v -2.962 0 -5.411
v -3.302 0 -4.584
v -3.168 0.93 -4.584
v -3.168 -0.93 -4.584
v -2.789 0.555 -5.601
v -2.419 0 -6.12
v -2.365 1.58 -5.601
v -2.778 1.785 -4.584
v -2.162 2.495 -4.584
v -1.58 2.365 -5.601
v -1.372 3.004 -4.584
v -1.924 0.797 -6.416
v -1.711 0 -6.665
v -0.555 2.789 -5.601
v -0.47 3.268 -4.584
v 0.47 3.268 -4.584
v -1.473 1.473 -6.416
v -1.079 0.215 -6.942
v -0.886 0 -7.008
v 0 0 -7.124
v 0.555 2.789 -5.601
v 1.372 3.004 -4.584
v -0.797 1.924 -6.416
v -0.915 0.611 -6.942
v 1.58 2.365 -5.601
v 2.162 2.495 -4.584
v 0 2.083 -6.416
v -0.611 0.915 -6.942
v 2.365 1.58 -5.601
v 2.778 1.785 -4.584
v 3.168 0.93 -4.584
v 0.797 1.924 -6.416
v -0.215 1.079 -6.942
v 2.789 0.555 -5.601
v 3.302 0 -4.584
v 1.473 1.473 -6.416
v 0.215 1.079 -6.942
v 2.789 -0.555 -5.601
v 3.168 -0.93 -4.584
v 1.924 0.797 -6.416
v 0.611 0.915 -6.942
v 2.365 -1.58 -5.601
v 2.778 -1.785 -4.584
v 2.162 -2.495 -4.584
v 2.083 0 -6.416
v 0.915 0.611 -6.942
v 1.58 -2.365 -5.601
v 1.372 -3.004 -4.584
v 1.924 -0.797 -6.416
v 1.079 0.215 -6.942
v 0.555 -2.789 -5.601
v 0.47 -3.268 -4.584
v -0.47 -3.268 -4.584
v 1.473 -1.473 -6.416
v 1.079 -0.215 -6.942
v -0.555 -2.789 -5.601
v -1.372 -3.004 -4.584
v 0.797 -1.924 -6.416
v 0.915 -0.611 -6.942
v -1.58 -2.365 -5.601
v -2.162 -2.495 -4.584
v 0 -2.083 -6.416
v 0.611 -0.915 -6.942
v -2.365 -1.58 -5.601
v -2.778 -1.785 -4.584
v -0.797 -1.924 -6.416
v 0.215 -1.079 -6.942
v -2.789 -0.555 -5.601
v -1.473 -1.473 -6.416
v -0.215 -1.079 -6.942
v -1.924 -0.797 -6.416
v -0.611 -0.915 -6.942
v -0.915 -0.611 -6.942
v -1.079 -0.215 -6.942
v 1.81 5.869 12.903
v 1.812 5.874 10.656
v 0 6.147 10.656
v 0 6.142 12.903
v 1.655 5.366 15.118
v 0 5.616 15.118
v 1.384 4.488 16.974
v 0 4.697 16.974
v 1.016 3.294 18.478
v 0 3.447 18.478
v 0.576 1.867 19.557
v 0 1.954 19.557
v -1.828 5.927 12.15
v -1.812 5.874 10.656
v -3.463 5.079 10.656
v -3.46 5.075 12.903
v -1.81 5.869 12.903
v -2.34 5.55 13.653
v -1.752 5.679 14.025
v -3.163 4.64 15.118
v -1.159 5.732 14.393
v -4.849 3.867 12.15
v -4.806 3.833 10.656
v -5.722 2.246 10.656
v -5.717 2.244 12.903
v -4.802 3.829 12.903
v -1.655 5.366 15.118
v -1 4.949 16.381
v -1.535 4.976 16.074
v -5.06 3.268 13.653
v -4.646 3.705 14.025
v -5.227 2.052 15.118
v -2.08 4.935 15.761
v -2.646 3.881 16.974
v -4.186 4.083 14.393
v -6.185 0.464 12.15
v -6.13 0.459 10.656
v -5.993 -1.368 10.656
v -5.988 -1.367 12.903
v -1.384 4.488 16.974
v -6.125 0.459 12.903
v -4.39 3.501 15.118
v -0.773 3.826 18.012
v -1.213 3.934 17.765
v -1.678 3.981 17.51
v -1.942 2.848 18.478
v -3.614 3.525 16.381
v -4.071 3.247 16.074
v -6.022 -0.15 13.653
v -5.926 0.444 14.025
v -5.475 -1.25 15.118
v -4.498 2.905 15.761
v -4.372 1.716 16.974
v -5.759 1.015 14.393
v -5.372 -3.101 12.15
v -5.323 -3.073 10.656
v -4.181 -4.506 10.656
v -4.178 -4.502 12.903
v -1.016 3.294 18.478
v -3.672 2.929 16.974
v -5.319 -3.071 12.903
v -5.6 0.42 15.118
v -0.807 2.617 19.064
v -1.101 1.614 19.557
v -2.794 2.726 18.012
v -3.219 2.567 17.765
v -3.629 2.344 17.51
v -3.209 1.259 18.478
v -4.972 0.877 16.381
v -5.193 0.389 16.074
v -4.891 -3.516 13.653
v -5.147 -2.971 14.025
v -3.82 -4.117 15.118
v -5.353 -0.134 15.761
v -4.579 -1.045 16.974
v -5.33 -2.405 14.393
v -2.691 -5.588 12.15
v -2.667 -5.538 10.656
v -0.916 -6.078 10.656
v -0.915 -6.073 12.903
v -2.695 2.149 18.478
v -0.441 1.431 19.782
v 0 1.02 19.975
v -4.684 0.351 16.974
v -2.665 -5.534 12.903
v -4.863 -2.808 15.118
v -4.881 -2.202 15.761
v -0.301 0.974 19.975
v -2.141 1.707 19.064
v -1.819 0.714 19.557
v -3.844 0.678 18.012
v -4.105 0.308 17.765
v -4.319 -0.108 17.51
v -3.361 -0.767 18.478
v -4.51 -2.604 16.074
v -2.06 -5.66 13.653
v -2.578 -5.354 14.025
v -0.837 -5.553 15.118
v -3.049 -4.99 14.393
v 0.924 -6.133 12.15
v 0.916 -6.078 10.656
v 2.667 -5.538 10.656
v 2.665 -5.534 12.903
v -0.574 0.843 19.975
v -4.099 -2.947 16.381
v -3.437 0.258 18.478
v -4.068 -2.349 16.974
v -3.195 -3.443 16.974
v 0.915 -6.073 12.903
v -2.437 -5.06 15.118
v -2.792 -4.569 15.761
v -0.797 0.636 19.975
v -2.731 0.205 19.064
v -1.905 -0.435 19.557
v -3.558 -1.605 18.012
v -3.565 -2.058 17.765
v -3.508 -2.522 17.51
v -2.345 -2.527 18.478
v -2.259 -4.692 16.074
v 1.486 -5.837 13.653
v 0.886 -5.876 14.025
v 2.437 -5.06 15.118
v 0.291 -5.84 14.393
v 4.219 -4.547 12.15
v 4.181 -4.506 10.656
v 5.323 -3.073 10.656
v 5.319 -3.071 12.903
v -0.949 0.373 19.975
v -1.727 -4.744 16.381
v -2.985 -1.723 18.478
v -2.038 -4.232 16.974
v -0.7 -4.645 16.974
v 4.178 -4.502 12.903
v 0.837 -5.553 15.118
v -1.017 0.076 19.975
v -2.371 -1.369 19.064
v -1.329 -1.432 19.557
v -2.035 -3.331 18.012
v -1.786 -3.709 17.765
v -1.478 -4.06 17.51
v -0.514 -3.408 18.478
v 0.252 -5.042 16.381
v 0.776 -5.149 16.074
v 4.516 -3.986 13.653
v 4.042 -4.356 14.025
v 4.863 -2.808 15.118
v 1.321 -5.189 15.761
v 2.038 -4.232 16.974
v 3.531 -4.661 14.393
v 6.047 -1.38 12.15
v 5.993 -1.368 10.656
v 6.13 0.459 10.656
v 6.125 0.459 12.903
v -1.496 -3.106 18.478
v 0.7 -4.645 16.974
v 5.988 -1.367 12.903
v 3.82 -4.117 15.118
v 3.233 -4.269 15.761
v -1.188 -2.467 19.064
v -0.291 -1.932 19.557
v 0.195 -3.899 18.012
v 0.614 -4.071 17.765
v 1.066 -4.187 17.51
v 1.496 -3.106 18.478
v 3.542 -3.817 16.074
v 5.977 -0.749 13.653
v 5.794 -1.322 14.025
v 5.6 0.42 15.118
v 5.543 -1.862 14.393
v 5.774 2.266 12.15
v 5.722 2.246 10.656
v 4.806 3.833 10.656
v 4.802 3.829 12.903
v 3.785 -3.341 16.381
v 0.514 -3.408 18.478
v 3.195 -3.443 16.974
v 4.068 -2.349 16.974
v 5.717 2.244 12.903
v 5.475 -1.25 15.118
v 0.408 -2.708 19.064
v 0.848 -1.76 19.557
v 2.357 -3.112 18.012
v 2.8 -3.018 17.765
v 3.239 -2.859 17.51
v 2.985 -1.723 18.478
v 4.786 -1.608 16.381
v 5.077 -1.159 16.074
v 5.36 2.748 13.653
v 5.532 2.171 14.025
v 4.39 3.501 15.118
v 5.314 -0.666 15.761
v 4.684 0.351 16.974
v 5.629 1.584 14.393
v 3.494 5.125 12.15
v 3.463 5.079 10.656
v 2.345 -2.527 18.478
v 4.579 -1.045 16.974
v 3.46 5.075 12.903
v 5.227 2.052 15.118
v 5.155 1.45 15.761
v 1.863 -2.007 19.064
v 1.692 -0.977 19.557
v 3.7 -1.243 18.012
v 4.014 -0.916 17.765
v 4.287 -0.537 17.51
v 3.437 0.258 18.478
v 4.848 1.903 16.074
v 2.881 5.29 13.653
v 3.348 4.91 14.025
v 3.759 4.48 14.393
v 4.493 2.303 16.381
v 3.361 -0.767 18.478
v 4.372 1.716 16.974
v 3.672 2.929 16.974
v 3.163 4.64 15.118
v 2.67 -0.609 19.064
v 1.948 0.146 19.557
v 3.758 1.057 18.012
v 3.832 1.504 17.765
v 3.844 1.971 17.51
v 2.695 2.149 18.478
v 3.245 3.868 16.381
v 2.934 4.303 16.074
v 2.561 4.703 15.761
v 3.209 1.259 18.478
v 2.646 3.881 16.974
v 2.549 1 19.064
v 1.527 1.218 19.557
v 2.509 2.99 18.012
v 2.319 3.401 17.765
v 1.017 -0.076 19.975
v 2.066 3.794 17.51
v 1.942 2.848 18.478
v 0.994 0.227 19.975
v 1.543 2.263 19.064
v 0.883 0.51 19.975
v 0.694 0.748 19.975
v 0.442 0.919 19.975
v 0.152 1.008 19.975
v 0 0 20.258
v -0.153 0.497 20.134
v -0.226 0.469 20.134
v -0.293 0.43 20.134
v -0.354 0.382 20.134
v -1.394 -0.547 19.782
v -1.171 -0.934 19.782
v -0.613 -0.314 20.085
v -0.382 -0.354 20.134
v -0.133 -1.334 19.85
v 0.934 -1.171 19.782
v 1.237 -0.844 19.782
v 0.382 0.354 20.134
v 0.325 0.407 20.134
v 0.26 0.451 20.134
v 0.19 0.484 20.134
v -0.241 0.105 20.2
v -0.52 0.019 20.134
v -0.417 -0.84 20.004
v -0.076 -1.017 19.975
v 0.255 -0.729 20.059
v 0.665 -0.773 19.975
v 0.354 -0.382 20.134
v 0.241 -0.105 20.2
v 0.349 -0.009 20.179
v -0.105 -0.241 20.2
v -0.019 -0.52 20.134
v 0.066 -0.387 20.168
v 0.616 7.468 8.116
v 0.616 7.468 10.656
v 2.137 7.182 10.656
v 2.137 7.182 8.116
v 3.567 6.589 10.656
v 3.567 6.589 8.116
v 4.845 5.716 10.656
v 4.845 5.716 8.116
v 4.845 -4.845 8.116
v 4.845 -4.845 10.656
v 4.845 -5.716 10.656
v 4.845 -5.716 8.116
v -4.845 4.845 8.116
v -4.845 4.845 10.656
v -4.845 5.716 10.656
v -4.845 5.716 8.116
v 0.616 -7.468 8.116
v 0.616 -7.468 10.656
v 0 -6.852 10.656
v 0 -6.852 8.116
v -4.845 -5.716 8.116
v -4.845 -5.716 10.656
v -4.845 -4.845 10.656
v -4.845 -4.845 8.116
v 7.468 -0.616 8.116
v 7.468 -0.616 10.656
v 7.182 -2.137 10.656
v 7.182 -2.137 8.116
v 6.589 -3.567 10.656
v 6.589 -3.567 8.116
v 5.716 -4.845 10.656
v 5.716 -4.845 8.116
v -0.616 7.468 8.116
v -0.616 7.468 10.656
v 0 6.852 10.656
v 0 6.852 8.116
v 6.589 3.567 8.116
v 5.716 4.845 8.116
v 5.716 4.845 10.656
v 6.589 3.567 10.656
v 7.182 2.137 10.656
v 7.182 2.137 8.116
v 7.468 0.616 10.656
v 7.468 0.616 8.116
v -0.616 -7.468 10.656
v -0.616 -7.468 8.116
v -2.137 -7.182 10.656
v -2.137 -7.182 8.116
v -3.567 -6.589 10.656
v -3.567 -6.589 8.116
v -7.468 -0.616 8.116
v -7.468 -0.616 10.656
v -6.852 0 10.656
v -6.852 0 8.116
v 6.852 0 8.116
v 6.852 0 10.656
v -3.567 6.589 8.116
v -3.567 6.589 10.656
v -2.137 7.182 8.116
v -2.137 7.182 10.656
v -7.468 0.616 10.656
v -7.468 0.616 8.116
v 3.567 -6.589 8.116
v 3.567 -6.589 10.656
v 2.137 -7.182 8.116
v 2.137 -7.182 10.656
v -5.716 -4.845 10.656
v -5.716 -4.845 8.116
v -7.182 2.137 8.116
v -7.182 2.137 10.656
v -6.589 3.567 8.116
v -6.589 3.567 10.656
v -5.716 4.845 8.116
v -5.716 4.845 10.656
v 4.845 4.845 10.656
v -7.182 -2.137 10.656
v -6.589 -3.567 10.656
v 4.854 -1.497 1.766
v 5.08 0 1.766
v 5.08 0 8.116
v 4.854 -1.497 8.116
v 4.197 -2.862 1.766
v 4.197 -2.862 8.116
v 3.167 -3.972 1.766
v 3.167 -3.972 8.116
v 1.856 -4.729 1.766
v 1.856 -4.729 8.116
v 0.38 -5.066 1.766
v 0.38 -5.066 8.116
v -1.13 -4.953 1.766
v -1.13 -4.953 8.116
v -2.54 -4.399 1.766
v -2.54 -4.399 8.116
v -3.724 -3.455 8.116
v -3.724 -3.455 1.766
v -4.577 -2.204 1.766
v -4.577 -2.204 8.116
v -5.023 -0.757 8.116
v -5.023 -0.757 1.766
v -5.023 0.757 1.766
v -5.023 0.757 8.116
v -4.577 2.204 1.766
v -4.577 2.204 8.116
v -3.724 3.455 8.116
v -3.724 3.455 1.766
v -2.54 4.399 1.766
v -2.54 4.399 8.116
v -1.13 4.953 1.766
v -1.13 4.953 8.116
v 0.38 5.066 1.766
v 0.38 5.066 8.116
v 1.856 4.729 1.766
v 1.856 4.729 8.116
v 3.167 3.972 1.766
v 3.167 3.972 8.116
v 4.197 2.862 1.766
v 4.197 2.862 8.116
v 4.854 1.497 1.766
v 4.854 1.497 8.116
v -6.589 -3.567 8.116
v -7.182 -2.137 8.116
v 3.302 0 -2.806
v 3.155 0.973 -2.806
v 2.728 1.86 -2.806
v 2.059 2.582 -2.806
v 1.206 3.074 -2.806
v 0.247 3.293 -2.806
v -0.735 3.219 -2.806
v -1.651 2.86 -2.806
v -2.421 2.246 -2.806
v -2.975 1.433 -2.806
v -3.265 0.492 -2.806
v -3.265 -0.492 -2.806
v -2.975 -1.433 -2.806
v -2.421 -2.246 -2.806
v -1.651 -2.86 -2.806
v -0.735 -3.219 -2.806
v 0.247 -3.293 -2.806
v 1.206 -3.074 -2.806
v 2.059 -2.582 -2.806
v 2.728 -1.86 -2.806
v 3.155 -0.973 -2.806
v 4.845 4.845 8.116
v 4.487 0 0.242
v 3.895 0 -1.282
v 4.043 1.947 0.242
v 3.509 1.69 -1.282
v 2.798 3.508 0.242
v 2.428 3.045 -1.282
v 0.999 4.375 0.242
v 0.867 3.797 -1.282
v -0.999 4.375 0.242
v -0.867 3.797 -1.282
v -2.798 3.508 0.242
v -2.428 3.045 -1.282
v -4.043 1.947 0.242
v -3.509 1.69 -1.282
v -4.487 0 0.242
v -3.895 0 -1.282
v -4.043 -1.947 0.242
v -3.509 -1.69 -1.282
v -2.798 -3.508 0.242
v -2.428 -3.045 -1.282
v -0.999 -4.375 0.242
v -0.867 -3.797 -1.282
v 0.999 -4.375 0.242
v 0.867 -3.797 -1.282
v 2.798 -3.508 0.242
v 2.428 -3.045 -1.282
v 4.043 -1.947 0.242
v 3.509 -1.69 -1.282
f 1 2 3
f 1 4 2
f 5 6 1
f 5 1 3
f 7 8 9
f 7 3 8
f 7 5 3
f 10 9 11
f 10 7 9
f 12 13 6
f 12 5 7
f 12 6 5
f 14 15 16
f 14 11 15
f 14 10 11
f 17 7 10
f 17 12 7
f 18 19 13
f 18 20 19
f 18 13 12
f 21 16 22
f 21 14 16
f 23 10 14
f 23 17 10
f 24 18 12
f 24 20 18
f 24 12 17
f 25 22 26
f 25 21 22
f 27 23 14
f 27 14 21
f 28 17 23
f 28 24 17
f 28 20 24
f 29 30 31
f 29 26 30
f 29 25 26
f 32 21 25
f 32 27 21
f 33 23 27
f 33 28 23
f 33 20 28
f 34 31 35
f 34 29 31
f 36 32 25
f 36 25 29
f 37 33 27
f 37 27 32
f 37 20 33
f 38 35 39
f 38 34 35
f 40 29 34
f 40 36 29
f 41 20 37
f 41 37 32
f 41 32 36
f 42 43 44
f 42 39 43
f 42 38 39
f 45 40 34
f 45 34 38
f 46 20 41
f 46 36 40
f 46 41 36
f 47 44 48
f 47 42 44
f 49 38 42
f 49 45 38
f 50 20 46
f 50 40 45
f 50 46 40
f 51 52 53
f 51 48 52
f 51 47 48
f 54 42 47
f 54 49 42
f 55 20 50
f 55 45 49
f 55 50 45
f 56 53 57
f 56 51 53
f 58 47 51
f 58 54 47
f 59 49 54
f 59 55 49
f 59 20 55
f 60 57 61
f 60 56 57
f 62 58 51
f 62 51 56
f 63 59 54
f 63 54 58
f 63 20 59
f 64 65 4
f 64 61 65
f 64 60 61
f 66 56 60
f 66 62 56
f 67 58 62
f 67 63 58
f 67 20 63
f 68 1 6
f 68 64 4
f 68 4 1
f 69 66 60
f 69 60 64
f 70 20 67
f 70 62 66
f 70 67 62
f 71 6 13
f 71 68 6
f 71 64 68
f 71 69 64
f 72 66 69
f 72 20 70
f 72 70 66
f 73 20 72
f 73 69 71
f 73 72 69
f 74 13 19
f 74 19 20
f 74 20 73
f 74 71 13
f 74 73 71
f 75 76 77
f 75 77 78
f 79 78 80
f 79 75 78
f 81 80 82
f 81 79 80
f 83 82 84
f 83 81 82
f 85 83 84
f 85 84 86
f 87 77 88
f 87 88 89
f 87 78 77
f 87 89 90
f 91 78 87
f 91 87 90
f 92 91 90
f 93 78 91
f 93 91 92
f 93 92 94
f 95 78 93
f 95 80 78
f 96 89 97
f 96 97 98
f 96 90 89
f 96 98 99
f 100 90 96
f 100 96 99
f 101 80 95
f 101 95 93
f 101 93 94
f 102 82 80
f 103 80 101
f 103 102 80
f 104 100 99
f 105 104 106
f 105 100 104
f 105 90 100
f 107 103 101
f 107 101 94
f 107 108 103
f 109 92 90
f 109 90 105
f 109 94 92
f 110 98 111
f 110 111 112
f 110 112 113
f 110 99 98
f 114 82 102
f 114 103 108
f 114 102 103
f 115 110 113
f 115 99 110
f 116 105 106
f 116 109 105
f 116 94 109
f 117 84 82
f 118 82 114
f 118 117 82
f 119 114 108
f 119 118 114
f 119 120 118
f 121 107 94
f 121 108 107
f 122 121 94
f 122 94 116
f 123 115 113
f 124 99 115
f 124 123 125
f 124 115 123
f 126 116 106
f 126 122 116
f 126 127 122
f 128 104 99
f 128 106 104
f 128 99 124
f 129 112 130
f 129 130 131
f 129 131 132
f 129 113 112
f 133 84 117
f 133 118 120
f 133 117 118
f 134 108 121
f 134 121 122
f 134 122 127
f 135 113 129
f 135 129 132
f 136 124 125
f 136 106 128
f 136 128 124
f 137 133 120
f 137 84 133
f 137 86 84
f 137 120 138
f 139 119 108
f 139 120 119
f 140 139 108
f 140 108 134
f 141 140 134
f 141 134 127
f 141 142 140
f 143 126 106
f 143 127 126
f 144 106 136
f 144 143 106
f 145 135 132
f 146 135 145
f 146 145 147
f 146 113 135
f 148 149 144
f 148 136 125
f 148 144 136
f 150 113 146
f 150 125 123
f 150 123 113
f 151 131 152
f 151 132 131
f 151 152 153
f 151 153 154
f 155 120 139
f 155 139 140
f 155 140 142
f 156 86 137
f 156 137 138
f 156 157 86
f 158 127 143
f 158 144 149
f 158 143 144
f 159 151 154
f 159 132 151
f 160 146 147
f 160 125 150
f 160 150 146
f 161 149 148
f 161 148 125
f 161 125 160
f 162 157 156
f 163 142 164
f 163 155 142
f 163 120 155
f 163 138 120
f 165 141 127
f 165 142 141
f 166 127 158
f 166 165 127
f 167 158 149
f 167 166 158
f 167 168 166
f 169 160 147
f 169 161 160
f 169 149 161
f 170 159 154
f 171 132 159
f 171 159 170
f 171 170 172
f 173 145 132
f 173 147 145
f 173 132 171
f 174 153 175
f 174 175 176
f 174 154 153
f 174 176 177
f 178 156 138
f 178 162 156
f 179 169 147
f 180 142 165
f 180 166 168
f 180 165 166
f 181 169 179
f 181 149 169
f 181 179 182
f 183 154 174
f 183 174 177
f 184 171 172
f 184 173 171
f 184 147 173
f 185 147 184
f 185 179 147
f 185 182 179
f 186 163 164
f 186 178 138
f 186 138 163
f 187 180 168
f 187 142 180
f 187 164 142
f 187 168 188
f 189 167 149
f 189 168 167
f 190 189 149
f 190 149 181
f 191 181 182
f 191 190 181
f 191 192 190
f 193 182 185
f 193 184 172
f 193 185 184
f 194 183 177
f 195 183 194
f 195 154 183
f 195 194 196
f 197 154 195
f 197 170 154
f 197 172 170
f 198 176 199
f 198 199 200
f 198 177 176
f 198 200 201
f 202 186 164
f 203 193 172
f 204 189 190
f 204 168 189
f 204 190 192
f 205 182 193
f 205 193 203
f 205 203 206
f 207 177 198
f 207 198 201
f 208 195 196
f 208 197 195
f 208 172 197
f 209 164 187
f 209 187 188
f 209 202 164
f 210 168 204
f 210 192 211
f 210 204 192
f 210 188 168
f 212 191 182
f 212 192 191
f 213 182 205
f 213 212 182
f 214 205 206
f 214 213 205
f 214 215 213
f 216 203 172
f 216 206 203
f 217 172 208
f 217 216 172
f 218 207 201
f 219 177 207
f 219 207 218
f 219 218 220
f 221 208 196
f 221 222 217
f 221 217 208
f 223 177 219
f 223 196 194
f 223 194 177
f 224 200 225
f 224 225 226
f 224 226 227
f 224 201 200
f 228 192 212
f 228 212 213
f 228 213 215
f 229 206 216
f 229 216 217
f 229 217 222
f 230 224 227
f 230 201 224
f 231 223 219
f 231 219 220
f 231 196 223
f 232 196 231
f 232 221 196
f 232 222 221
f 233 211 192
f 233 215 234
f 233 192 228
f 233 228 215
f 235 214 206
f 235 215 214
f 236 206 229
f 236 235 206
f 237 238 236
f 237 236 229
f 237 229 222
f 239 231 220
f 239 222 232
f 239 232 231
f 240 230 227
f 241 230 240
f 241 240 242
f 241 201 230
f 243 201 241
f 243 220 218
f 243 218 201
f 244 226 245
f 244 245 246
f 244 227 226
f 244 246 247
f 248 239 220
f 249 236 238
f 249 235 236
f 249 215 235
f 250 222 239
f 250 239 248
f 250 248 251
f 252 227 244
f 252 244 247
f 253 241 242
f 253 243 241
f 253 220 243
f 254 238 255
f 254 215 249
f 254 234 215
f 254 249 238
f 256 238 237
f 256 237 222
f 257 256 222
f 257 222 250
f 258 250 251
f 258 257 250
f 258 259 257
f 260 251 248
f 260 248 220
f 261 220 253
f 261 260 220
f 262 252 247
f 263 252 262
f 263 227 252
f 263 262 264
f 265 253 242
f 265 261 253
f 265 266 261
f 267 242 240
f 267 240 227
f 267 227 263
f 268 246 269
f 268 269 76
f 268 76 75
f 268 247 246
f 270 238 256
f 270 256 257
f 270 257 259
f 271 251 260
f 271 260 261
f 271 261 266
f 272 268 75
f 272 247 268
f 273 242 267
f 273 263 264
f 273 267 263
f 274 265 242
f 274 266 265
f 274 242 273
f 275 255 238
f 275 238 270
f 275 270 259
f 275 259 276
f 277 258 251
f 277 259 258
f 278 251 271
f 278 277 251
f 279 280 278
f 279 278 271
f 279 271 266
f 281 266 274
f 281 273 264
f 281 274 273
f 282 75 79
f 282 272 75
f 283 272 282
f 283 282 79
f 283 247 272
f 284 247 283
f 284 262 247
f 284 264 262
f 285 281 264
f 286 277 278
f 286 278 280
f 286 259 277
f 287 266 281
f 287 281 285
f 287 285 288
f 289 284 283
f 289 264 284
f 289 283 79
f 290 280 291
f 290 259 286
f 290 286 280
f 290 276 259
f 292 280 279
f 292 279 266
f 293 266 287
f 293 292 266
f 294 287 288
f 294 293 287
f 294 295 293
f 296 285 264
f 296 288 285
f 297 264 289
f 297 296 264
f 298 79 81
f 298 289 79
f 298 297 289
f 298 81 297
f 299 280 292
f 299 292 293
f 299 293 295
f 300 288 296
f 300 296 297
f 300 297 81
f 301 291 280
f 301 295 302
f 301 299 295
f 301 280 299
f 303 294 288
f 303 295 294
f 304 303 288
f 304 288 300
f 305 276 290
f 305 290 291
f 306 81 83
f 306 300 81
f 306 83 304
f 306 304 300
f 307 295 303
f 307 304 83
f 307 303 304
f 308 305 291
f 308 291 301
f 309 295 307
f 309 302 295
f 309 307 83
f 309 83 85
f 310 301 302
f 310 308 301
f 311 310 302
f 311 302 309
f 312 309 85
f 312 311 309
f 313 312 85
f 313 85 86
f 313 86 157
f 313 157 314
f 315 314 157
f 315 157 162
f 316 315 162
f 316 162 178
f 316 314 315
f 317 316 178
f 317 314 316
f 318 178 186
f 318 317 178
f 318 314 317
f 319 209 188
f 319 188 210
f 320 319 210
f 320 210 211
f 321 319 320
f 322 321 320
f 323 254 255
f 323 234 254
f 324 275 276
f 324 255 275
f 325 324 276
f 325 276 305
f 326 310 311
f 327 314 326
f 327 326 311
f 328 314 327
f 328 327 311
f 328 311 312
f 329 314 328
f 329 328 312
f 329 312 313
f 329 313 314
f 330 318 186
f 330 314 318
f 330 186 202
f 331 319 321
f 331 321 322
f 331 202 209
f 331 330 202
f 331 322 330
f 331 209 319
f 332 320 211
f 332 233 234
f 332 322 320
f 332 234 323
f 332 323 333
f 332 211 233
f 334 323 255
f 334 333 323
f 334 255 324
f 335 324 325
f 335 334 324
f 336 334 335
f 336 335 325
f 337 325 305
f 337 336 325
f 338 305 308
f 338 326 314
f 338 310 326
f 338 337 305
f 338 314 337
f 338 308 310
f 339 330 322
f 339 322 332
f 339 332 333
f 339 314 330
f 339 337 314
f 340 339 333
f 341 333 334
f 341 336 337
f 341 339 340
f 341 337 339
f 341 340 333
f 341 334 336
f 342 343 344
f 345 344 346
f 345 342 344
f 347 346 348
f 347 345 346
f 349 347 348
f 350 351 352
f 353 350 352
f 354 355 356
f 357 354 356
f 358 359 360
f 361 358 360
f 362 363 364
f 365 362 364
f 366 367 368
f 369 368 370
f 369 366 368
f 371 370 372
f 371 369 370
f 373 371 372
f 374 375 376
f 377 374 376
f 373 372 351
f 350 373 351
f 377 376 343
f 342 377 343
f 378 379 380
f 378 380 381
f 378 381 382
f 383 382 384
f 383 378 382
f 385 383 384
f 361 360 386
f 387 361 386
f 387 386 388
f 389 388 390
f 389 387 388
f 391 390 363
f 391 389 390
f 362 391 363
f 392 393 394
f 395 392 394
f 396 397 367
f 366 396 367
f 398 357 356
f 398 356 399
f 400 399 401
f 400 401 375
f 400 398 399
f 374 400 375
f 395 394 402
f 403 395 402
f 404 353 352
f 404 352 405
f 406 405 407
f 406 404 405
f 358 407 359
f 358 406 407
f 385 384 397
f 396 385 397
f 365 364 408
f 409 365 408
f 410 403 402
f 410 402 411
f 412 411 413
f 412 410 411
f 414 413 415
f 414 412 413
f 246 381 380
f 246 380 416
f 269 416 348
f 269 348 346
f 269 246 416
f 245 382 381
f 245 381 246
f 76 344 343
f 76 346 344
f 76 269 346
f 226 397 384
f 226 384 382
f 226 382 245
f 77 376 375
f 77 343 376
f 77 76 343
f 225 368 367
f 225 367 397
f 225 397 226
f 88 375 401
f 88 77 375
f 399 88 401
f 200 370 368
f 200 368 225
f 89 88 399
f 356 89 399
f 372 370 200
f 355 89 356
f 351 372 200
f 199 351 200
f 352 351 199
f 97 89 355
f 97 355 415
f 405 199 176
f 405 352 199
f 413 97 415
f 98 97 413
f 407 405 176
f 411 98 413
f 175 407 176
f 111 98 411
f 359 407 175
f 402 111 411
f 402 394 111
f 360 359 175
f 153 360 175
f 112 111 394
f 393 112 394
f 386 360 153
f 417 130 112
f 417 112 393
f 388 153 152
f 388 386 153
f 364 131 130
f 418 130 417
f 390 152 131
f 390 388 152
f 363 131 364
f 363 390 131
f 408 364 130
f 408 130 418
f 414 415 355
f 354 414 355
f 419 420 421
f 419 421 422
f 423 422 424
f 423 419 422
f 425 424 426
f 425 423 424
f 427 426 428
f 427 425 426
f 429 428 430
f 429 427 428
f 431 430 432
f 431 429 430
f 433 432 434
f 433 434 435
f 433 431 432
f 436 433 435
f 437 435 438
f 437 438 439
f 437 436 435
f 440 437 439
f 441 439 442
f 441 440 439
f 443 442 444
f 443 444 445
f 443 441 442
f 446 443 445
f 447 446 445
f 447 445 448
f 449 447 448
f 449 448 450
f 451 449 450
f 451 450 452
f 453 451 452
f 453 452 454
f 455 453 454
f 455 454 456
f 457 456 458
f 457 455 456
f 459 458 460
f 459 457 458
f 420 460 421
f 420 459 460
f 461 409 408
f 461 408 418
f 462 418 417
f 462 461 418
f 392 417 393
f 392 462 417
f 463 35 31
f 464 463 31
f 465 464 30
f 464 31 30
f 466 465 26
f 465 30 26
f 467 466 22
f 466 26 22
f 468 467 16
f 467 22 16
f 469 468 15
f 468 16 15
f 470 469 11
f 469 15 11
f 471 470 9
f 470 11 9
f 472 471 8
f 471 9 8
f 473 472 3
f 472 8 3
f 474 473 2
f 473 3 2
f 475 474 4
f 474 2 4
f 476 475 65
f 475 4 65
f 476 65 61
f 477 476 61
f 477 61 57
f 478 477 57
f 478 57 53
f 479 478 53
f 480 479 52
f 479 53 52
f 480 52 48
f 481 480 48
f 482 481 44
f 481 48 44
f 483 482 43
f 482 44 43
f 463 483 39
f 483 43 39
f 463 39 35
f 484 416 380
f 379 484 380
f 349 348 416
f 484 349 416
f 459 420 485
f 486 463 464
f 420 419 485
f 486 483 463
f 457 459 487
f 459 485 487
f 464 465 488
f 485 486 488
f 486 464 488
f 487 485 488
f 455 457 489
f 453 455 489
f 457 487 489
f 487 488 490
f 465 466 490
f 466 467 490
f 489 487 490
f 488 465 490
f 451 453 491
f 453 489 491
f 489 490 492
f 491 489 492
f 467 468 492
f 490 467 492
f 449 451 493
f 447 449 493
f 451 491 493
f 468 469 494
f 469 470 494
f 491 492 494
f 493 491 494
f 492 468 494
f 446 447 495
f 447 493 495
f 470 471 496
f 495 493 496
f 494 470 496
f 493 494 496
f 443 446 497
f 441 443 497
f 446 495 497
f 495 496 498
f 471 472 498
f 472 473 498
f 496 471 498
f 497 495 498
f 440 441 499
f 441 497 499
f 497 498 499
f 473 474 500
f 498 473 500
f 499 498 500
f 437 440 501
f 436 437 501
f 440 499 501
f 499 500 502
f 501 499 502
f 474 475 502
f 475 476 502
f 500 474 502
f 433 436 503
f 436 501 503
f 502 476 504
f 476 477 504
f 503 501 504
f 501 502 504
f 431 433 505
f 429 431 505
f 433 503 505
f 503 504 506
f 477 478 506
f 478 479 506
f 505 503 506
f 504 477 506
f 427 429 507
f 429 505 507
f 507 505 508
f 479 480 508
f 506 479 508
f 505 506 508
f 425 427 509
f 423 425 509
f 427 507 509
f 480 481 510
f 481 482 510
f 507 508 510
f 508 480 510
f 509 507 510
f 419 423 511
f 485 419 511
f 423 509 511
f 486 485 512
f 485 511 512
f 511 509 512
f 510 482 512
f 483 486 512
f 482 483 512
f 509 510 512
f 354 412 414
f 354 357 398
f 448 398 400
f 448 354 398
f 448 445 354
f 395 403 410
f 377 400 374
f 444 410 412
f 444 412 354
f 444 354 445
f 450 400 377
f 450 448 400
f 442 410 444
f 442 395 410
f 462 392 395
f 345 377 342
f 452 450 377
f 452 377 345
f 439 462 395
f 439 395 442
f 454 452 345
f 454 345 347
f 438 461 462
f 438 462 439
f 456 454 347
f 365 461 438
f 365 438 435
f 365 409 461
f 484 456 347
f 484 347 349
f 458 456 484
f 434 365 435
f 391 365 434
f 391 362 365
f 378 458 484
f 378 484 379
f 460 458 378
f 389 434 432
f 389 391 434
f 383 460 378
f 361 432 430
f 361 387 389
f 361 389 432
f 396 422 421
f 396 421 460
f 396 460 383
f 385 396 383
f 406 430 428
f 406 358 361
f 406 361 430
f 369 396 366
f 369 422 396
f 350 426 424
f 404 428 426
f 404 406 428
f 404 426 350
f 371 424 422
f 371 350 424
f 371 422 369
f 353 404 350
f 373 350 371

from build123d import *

# Parameters (mm, degrees)
DOME2_FACE_RADIUS  = 3.302
DOME2_HEIGHT       = 2.54
CUT_EXTRUDE2_DEPTH = 21.698272827
SEEDCUT_COUNT      = 8


# Read off the part's stored shape, not the designer's step: Cut-Revolve-Thin5
with BuildPart() as part:
    # Sketch5 → Revolve1 (revolve)
    with BuildSketch(Plane(origin=(0, 0, 0), x_dir=(0, 0, -1), z_dir=(1, 0, 0)), mode=Mode.PRIVATE) as revolve1_sk:
        Polygon((-10.655580084, 0), (-10.655580084, 7.493), (-8.115580084, 7.493), (-8.115580084, 5.08), (4.584419916, 5.08), (4.584419916, 0), align=None)
    revolve(revolve1_sk.sketch.rotate(Axis((0, 0, 7.652463568), (0, 0, -1)), 90), axis=Axis((0, 0, 7.652463568), (0, 0, -1)))

    # Sketch8 → Revolve3 (revolve)
    with BuildSketch(Plane(origin=(0, 0, 0), x_dir=(0, 0, -1), z_dir=(1, 0, 0))):
        with BuildLine():
            Line((-20.257637537, 0), (-10.655580084, 0))
            Line((-10.655580084, 0), (-10.655580084, 6.146975902))
            add(Edge.make_bspline(
                [(-10.655580084, 6.146975902), (-14.696094585, 6.626842046), (-19.387675836, 4.389685938), (-20.257637537, 0)],
                knots=[0, 0, 0, 0, 1, 1, 1, 1], degree=3))
        make_face()
    revolve(axis=Axis((0, 0, 7.652463568), (0, 0, 1)))

    # Cut-Revolve-Thin5 outline → Cut-Revolve-Thin5 (revolve, cut)
    with BuildSketch(Plane.XZ):
        Polygon((3.302, -2.806419916), (3.302, -4.584419916), (5.08, -4.584419916), (5.08, 1.765580084), align=None)
    revolve(axis=Axis((0, 0, 0), (0, 0, 1)), mode=Mode.SUBTRACT)

    # Dome2: a dome of height H over a round flat face of radius A is a cap of a sphere of radius (A * A + H * H) / (2 * H)
    dome2_r = (DOME2_FACE_RADIUS * DOME2_FACE_RADIUS + DOME2_HEIGHT * DOME2_HEIGHT) / (2 * DOME2_HEIGHT)
    dome2_base = Plane((0, 0, -4.584419916), z_dir=(0, 0, -1))
    with Locations(dome2_base.offset(DOME2_HEIGHT - dome2_r)):
        dome2_ball = Sphere(dome2_r, mode=Mode.PRIVATE)
    add(split(dome2_ball, bisect_by=dome2_base, keep=Keep.TOP, mode=Mode.PRIVATE))

    # Sketch12 → Cut-Extrude2 (cut, through all)
    with BuildSketch(Plane.XY.offset(10.655580084)):
        with BuildLine():
            Line((0, 6.851966826), (0.615694723, 7.467661549))
            ThreePointArc((0.615694723, 7.467661549), (0, 7.493), (-0.615694723, 7.467661549))
            Line((-0.615694723, 7.467661549), (0, 6.851966826))
        make_face()
    cut_extrude2 = extrude(amount=-CUT_EXTRUDE2_DEPTH, mode=Mode.SUBTRACT)

    # SeedCut: Cut-Extrude2 ×8 about axis
    seedcut_axis = Axis((0, 0, 0), (0, 0, 1))
    for i in range(1, SEEDCUT_COUNT):
        add(cut_extrude2.rotate(seedcut_axis, i * 360 / SEEDCUT_COUNT), mode=Mode.SUBTRACT)


solid = part.part
